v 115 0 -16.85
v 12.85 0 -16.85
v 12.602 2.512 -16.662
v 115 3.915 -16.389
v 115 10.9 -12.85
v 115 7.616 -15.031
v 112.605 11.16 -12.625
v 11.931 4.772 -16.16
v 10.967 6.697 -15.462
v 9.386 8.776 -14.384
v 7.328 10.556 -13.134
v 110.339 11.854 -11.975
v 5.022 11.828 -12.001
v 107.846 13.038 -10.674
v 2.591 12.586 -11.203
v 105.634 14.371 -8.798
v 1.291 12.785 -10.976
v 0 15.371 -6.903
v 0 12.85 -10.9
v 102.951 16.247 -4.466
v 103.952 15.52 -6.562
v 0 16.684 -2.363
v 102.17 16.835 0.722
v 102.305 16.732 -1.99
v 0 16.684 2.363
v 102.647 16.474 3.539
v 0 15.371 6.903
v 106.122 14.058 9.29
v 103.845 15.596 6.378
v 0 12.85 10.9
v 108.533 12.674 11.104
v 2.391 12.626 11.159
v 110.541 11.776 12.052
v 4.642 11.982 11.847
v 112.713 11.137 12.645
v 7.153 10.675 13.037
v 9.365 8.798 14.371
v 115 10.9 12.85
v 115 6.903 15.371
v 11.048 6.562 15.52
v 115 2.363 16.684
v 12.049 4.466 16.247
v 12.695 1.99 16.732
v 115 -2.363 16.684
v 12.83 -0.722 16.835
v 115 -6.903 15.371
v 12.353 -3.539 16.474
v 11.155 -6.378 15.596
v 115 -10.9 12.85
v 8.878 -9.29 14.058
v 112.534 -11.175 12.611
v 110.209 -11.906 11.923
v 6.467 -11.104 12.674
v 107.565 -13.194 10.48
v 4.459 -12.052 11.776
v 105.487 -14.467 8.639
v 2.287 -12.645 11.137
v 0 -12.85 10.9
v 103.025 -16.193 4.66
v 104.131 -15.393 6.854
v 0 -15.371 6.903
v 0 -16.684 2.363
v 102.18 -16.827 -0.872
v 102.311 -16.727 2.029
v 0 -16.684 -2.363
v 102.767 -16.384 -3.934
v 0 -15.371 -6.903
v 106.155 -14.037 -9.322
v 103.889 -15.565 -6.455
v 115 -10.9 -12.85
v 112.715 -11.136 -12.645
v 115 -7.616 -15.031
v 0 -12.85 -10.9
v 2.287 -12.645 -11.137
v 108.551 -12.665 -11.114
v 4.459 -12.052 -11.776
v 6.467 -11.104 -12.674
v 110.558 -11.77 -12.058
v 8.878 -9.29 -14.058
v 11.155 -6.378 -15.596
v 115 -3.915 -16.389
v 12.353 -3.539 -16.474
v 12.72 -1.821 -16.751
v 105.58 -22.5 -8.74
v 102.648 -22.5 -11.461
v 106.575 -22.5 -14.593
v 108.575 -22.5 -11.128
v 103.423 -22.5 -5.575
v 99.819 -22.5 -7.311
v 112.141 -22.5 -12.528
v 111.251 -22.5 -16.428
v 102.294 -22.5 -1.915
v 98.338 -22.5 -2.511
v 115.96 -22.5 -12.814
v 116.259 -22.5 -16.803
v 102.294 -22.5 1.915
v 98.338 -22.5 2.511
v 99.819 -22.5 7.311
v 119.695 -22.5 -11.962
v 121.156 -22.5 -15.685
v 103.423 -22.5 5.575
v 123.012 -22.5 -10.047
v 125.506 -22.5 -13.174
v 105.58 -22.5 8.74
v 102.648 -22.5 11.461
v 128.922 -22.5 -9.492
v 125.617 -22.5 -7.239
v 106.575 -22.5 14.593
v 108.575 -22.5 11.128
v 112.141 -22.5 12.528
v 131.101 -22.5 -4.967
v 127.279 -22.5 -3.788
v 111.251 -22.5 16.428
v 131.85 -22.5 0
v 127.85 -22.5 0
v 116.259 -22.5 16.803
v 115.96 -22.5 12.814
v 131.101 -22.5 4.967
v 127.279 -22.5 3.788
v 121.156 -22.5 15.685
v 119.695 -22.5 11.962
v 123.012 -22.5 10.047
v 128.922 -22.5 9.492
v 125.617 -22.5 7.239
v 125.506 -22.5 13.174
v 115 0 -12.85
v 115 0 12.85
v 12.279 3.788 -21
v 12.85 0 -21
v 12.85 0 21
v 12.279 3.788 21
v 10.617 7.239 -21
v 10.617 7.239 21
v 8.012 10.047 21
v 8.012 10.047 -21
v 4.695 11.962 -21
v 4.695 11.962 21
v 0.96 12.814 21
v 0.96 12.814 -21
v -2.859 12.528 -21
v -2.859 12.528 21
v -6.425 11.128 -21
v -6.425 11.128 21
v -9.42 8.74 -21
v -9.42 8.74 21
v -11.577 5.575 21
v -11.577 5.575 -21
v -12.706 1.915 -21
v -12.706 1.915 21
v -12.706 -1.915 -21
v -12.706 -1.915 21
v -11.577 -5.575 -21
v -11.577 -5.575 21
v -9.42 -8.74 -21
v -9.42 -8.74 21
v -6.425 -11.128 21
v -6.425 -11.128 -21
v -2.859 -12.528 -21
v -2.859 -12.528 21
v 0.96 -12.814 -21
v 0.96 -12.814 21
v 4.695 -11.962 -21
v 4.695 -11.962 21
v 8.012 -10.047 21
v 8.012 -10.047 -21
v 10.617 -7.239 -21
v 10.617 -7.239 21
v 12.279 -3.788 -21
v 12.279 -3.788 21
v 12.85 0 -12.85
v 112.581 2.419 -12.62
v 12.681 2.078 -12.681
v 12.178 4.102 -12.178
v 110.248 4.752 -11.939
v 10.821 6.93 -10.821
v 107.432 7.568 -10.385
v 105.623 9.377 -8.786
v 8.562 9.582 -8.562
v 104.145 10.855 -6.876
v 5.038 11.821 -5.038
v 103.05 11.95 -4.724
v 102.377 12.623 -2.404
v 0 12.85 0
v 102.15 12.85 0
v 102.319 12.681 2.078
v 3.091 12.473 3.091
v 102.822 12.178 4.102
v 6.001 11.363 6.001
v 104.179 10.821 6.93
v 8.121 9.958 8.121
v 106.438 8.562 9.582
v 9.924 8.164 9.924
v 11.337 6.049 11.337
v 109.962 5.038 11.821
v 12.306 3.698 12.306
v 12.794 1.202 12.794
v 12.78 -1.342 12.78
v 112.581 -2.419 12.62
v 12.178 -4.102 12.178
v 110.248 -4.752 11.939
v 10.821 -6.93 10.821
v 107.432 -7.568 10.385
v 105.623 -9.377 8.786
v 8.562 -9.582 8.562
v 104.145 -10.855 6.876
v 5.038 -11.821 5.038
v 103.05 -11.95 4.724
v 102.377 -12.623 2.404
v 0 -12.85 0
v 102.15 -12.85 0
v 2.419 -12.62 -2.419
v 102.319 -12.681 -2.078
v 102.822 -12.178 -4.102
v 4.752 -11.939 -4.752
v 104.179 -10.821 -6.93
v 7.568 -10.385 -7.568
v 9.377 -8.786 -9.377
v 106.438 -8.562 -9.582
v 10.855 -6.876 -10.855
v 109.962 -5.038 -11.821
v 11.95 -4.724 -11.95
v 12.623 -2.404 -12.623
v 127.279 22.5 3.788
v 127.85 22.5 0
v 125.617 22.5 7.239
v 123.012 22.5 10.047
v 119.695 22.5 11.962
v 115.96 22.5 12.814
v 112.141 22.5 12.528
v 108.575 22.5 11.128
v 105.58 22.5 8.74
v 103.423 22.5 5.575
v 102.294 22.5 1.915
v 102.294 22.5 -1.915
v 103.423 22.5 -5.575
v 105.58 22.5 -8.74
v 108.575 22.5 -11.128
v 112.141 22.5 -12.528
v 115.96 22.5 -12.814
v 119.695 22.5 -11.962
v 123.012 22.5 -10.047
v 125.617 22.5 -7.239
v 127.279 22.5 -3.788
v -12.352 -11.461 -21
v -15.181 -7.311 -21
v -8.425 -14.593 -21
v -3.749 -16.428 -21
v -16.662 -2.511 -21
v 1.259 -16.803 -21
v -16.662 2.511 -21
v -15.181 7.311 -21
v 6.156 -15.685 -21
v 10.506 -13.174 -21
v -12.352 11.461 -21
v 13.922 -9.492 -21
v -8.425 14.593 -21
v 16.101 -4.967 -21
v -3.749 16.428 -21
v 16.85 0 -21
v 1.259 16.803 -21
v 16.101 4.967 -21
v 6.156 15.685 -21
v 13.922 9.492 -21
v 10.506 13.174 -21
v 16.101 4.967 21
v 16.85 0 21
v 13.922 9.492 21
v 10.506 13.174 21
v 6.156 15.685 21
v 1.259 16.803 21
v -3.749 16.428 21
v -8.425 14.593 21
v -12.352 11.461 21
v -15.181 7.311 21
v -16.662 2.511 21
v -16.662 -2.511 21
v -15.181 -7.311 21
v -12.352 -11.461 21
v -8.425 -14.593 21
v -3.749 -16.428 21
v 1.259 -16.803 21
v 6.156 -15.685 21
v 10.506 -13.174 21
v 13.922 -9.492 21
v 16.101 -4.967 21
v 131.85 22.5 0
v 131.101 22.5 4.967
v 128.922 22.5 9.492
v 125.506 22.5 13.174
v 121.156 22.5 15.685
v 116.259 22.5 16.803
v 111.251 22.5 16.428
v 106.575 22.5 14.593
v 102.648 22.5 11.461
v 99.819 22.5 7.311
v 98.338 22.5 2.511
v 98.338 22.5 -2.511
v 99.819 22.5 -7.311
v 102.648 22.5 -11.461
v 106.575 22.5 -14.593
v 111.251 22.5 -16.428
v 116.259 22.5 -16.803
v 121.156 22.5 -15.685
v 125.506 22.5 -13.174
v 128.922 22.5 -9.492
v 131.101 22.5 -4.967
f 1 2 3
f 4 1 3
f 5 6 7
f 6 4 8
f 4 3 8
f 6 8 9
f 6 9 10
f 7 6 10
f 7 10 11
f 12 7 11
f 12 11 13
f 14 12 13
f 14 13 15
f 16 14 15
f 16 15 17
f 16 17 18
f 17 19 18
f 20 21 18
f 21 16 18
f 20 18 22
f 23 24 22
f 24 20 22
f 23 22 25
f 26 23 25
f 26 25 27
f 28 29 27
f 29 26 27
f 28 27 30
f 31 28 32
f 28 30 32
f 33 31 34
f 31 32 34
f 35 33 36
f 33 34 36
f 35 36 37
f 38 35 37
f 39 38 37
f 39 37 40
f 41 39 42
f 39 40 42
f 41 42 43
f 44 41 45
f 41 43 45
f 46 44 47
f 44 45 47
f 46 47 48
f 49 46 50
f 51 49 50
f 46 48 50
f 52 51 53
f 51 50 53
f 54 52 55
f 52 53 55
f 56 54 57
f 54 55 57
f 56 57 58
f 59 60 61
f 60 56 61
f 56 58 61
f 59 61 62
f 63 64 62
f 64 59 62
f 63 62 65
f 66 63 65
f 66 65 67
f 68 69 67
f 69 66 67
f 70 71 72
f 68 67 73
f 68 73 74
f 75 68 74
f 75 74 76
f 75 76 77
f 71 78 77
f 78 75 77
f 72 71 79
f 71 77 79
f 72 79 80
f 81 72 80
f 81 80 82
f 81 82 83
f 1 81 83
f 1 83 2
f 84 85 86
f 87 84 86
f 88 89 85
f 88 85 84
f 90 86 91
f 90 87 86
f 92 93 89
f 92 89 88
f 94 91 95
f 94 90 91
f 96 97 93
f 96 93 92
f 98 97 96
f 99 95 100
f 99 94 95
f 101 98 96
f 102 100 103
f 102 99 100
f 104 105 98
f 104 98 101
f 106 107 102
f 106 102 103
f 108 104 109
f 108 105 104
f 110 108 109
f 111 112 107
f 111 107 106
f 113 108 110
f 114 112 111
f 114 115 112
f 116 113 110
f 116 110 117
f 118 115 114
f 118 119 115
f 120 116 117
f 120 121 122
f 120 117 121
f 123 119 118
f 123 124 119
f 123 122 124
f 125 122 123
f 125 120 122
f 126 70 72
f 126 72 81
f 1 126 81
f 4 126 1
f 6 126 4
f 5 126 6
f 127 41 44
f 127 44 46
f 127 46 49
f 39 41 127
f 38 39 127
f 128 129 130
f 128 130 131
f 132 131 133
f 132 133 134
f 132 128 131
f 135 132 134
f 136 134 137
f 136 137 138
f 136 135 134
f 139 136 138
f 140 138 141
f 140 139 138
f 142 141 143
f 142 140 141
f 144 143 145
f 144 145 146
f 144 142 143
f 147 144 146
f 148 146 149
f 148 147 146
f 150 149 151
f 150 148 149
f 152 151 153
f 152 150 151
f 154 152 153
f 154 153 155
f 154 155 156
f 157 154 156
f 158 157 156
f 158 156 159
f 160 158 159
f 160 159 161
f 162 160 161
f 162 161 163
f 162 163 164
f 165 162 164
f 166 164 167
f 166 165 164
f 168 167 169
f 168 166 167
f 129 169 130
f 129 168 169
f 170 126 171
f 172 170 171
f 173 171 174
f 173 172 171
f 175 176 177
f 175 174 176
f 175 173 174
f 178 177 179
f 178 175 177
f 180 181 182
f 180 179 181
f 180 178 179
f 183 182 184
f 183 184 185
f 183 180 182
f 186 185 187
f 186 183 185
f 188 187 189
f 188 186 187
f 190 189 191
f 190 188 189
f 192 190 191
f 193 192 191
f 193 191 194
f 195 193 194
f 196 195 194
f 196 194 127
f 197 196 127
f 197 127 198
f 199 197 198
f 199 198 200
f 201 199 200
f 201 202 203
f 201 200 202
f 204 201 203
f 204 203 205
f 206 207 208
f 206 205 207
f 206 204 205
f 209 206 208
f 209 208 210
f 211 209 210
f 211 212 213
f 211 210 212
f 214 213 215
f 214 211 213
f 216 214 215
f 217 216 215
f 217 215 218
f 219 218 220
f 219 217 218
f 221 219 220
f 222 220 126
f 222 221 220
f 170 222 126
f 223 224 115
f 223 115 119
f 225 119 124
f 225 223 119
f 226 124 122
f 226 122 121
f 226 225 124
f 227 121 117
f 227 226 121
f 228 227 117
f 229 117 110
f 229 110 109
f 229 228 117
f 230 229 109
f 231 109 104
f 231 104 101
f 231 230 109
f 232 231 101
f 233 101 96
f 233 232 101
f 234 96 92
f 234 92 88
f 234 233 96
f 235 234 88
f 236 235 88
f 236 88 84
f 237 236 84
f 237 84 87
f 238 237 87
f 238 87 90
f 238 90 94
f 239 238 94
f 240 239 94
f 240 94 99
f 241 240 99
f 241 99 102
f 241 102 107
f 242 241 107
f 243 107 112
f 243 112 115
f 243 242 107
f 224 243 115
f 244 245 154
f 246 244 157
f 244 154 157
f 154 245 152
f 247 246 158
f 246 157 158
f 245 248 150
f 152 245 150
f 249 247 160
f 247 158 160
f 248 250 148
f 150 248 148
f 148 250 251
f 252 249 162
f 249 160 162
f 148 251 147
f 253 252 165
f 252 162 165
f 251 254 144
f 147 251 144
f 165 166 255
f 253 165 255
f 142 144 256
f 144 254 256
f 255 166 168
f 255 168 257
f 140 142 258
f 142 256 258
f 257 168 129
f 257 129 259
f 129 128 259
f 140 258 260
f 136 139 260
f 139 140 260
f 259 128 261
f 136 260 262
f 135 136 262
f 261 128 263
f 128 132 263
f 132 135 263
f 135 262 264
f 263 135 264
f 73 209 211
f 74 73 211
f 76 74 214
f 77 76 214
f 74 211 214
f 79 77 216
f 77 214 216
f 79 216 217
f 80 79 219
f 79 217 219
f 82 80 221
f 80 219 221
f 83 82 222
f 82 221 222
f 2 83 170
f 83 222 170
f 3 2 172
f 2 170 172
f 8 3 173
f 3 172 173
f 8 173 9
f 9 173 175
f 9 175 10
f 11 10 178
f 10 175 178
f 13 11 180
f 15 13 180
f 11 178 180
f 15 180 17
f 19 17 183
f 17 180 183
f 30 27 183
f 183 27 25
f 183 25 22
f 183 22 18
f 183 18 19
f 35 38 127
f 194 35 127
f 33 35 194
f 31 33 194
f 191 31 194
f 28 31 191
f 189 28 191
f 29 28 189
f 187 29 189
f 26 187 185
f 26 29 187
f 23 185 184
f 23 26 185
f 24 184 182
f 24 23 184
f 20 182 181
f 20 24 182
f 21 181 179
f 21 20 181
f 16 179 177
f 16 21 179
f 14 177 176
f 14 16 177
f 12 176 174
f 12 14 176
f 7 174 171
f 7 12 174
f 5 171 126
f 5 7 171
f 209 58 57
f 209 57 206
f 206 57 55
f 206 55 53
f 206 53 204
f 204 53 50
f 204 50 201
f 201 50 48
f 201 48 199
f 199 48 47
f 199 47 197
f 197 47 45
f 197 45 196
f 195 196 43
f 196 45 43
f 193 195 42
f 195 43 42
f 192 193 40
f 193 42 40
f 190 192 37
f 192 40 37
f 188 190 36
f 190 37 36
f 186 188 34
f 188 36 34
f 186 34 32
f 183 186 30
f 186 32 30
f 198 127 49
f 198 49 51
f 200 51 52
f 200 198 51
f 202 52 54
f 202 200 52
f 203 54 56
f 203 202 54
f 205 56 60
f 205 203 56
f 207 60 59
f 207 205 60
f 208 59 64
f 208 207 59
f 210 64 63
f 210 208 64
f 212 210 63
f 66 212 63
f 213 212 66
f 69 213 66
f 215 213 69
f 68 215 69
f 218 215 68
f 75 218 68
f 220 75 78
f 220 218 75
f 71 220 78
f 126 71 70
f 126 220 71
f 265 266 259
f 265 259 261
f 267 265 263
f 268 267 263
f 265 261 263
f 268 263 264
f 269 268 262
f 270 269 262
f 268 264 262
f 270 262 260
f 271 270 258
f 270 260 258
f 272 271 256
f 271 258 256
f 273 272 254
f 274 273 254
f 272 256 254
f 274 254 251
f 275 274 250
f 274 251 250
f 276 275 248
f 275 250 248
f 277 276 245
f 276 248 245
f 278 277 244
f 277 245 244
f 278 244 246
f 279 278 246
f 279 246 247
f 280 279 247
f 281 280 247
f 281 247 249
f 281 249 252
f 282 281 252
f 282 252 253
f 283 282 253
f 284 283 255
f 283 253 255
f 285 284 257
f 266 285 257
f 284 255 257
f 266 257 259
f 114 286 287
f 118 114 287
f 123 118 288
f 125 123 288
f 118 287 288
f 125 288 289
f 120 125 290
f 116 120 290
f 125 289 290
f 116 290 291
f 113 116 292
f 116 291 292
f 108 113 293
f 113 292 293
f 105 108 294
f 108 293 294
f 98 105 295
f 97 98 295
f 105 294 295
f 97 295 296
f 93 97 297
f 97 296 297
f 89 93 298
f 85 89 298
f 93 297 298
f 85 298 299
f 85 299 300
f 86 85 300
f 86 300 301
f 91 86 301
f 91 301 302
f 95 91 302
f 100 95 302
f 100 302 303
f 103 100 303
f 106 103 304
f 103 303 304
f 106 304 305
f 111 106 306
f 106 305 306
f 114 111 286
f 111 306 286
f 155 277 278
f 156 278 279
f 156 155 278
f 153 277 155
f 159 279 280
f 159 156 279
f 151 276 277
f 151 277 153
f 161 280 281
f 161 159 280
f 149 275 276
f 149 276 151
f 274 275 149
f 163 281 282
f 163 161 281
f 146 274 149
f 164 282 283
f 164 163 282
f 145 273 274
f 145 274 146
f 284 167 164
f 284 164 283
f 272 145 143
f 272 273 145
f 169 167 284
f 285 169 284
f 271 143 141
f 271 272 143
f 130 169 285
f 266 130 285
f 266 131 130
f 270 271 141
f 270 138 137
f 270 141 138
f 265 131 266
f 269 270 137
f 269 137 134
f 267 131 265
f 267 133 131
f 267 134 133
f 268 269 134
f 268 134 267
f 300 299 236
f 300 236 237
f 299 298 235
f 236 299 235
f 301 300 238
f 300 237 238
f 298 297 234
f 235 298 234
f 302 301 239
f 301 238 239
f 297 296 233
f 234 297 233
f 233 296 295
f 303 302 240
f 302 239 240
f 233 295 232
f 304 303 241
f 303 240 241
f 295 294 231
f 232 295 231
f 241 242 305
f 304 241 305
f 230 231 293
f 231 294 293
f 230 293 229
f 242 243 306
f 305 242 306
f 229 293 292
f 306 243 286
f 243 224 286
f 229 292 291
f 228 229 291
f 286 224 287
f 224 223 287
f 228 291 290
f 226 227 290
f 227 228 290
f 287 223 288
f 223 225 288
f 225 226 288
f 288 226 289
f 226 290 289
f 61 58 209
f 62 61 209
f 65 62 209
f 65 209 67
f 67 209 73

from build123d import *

# Parameters (mm, degrees)
SKETCH1_R                 = 16.85
SKETCH1_R_2               = 12.85
PIPE_33_7_X_4_0_1_DEPTH   = 42
SKETCH14_R                = 16.85
SKETCH14_R_2              = 12.85
PIPE_33_7_X_4_0_1_2_DEPTH = 115
SKETCH9_R                 = 16.85
SKETCH9_R_2               = 12.85
PIPE_33_7_X_4_0_2_DEPTH   = 45
SKETCH11_R                = 12.85
CUT_EXTRUDE2_DEPTH        = 141.195122954
CUT_EXTRUDE3_DEPTH        = 141.891527424
CUT_EXTRUDE3_DEPTH_BACK   = 141.891527424
SKETCH12_R                = 12.85


with BuildPart() as part:
    # Sketch1 → Pipe 33.7 X 4.0_1 (new body)
    with BuildSketch(Plane.XY.offset(-21)):
        Circle(SKETCH1_R)
        Circle(SKETCH1_R_2, mode=Mode.SUBTRACT)
    extrude(amount=PIPE_33_7_X_4_0_1_DEPTH)


with BuildPart() as body_2:
    # Sketch14 → Pipe 33.7 X 4.0_1 2 (new body)
    with BuildSketch(Plane(origin=(0, 0, 0), x_dir=(0, 0, -1), z_dir=(1, 0, 0))):
        Circle(SKETCH14_R)
        Circle(SKETCH14_R_2, mode=Mode.SUBTRACT)
    extrude(amount=PIPE_33_7_X_4_0_1_2_DEPTH)

    # Sketch11 → Cut-Extrude2 (cut, through all)
    with BuildSketch(Plane.XY.offset(21)):
        with Locations(Location((0, 0, 0), (0, 0, 180))):
            Circle(SKETCH11_R)
    extrude(amount=-CUT_EXTRUDE2_DEPTH, mode=Mode.SUBTRACT)

    # Sketch12 → Cut-Extrude3 (cut, two sides: drawn at the far end of the back side and taken through both)
    with BuildSketch(Plane.XZ.offset(22.5).offset(-CUT_EXTRUDE3_DEPTH_BACK)):
        with Locations(Location((115, 0, 0), (0, 0, 180))):
            Circle(SKETCH12_R)
    extrude(amount=CUT_EXTRUDE3_DEPTH + CUT_EXTRUDE3_DEPTH_BACK, mode=Mode.SUBTRACT)


with BuildPart() as body_3:
    # Sketch9 → Pipe 33.7 X 4.0(2) (new body)
    with BuildSketch(Plane(origin=(115, 22.5, 0), x_dir=(1, 0, 0), z_dir=(0, -1, 0))):
        Circle(SKETCH9_R)
        Circle(SKETCH9_R_2, mode=Mode.SUBTRACT)
    extrude(amount=PIPE_33_7_X_4_0_2_DEPTH)


solid = Compound([part.part, body_2.part, body_3.part])
